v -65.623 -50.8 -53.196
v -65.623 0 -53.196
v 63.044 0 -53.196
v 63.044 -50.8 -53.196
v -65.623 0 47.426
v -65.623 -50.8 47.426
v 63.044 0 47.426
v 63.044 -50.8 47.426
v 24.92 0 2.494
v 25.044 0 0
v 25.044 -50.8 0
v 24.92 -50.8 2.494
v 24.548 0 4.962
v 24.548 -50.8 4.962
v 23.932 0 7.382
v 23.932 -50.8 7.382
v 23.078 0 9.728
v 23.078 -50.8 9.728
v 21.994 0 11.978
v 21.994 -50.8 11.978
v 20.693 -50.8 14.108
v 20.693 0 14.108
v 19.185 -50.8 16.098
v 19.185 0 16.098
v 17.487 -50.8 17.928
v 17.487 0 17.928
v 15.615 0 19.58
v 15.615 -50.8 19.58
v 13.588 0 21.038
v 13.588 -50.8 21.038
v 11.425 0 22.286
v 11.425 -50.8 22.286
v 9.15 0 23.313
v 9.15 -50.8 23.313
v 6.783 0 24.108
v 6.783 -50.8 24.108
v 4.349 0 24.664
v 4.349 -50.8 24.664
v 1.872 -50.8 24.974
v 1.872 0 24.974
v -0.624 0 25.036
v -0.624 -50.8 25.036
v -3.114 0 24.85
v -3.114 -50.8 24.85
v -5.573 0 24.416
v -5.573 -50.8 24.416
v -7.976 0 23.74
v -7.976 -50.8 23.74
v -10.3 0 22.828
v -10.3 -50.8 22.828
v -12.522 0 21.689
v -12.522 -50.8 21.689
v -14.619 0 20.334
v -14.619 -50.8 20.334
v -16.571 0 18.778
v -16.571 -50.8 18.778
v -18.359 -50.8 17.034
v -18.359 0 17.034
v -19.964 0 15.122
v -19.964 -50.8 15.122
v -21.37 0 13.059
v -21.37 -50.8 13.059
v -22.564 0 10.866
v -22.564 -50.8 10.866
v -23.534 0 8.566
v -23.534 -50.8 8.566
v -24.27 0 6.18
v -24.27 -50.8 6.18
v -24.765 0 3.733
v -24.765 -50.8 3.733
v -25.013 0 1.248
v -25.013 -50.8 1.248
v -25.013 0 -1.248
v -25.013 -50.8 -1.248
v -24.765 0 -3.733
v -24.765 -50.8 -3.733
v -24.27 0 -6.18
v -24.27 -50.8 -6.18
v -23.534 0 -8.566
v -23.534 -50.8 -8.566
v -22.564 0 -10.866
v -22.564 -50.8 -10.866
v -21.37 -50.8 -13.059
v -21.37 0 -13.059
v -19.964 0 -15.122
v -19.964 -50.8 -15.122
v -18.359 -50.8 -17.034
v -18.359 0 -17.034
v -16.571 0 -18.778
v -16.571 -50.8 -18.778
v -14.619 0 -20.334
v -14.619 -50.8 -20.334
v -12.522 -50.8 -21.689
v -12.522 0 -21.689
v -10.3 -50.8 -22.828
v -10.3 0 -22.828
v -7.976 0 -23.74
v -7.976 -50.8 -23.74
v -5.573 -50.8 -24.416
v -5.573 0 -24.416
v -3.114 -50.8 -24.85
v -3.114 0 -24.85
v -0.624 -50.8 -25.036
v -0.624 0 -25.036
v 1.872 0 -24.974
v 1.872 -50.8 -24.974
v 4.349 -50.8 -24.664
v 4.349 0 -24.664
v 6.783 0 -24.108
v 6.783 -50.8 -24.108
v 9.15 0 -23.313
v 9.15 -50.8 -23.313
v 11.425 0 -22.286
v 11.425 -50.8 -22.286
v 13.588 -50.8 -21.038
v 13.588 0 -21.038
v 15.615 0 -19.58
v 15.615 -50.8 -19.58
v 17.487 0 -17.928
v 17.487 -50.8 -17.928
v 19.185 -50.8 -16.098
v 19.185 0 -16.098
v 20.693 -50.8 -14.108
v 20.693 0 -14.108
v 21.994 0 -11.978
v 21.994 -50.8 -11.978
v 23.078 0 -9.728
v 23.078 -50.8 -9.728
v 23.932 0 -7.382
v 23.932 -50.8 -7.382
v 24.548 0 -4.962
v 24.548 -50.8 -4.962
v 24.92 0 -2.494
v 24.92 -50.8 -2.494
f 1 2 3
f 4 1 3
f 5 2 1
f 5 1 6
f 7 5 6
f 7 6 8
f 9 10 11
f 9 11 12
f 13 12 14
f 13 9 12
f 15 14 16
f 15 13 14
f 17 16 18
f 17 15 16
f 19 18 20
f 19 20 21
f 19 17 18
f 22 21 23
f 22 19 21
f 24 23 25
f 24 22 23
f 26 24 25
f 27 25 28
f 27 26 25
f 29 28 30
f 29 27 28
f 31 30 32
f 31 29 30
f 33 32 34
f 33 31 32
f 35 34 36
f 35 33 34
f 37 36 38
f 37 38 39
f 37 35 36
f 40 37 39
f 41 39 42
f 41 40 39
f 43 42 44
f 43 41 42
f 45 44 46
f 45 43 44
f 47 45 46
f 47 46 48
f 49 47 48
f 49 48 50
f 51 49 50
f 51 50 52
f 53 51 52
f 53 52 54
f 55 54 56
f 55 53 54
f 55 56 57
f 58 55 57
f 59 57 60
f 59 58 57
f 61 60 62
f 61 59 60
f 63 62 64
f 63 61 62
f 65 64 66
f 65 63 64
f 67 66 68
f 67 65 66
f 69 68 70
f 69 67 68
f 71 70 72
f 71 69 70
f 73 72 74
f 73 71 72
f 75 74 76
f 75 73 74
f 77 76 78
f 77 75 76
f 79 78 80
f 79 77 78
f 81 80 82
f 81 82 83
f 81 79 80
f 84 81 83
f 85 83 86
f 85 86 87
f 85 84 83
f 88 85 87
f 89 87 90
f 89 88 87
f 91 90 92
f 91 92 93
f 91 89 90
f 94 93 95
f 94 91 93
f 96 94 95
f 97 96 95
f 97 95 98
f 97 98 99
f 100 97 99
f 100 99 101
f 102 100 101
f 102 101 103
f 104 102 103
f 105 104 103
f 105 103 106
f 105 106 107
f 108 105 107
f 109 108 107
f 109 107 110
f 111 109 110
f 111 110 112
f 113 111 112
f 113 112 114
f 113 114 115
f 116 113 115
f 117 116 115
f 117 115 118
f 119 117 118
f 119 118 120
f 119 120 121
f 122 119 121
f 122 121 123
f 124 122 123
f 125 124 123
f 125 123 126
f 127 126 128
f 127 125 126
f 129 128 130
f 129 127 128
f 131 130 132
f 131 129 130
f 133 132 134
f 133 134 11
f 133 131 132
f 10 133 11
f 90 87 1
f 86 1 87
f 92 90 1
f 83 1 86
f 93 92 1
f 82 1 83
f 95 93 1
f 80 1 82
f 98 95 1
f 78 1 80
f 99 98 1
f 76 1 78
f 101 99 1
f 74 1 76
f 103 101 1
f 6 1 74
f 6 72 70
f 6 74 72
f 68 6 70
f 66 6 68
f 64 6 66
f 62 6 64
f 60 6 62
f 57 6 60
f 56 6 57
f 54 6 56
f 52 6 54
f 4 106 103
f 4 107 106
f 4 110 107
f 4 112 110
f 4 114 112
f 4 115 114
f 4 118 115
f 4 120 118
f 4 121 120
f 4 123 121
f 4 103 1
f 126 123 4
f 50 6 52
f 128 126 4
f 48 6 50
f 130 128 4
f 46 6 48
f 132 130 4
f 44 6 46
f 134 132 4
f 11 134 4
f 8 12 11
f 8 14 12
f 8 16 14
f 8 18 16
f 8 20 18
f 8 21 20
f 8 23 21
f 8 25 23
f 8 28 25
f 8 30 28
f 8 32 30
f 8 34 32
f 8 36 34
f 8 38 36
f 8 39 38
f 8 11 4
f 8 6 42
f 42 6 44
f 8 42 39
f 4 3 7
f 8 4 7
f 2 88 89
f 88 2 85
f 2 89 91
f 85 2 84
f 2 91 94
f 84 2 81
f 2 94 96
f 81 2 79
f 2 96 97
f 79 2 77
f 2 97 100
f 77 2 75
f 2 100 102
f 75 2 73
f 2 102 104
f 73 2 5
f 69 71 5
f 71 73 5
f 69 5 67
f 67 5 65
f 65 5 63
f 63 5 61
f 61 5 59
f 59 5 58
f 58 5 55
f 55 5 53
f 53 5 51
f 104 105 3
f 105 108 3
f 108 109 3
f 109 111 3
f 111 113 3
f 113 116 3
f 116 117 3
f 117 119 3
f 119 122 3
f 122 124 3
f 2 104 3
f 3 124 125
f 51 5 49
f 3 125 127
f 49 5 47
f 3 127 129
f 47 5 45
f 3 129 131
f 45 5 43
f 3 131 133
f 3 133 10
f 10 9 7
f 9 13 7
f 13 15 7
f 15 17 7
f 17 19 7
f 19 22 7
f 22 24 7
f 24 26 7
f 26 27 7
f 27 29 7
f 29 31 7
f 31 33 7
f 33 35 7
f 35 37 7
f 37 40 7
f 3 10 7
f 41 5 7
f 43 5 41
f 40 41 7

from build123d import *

# Parameters (mm, degrees)
F0_W     = 128.6668404937
F0_H     = 100.6218641996
F0_R     = 25.0442711875
F1_DEPTH = 50.8


# Not quite as in the source:
# - the program builds the solid bodies; features that only make, move or delete a surface that nothing else refers to are left out


with BuildPart() as f1:
    # F0 (on Front) → F1 (new body)
    with BuildSketch(Plane.XZ):
        with Locations((-1.2895353138, -2.8847418725)):
            Rectangle(F0_W, F0_H)
        Circle(F0_R, mode=Mode.SUBTRACT)
    extrude(amount=F1_DEPTH)


solid = f1.part
